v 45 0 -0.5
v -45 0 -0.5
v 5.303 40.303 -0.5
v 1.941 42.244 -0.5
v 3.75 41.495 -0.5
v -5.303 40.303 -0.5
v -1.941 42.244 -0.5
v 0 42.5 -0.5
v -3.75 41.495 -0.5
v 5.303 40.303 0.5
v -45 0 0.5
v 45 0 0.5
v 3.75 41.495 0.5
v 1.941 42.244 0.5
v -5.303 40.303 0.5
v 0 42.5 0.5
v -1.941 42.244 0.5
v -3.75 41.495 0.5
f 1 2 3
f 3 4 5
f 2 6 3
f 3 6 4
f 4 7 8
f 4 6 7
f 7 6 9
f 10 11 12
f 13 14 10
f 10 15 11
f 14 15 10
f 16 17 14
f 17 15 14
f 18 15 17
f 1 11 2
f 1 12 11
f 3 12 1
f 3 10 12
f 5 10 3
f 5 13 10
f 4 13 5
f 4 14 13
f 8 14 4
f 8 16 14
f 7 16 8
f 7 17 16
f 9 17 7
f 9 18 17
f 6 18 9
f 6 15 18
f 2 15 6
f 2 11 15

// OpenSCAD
rTriangle1();
module rTriangle1(){
  linear_extrude(height = 1, center = true)
    hull() {
      polygon([[45,0],[0,20],[-45,0]]);
      translate([0,35,0]) circle(d=15);
    }
}

/*
minkowski(){
        linear_extrude(height = 1, center = true, convexity = 10, scale=0.9) polygon([[-45,0],[0,35],[45,0]]);
        translate([0,0,0]) sphere(r = 1);
    }
    */
/*
module daisha(){cube([900, 450, 10]);

translate([0,450,0])cylinder(h=600,r=10);
translate([0,0,0])cylinder(h=600,r=10);
rotate([-90,90,0])
translate([-600, 0, 00])
cylinder(h=450,r=10);
}

module tires(){
    cube([90, 45, 1]);
rotate([90,90,0])
translate([0,0,-1])
cube([45,90, 1]);
translate([0,45,0])
rotate([90,90,0])
cube([45,90, 1]);
}

module bug(){
cube([90, 45, 1]);
color("red")
translate([45,35,3])
cylinder(h=1, r=10);

color("blue")
rotate([0,0, ])
cube([45*sqrt(2), 45*sqrt(2), 1]);
}




module aaa(){
difference(){
    cube([90, 45, 1]);

color("blue")
translate([0,0,-1])
    rotate([0,0,81.85])
    cube([60, 60, 3]);
translate([90,0,-1])
    rotate([0,0,180-90-47.82])
    cube([60, 60, 3]);


    translate([0,0,-1])
    rotate([0,0,47.82])
    cube([60, 60, 3]);
}
}



union(){
        aaa();
color("red")
translate([45,35,0])
cylinder(h=1.5, r=10);

}
*/
